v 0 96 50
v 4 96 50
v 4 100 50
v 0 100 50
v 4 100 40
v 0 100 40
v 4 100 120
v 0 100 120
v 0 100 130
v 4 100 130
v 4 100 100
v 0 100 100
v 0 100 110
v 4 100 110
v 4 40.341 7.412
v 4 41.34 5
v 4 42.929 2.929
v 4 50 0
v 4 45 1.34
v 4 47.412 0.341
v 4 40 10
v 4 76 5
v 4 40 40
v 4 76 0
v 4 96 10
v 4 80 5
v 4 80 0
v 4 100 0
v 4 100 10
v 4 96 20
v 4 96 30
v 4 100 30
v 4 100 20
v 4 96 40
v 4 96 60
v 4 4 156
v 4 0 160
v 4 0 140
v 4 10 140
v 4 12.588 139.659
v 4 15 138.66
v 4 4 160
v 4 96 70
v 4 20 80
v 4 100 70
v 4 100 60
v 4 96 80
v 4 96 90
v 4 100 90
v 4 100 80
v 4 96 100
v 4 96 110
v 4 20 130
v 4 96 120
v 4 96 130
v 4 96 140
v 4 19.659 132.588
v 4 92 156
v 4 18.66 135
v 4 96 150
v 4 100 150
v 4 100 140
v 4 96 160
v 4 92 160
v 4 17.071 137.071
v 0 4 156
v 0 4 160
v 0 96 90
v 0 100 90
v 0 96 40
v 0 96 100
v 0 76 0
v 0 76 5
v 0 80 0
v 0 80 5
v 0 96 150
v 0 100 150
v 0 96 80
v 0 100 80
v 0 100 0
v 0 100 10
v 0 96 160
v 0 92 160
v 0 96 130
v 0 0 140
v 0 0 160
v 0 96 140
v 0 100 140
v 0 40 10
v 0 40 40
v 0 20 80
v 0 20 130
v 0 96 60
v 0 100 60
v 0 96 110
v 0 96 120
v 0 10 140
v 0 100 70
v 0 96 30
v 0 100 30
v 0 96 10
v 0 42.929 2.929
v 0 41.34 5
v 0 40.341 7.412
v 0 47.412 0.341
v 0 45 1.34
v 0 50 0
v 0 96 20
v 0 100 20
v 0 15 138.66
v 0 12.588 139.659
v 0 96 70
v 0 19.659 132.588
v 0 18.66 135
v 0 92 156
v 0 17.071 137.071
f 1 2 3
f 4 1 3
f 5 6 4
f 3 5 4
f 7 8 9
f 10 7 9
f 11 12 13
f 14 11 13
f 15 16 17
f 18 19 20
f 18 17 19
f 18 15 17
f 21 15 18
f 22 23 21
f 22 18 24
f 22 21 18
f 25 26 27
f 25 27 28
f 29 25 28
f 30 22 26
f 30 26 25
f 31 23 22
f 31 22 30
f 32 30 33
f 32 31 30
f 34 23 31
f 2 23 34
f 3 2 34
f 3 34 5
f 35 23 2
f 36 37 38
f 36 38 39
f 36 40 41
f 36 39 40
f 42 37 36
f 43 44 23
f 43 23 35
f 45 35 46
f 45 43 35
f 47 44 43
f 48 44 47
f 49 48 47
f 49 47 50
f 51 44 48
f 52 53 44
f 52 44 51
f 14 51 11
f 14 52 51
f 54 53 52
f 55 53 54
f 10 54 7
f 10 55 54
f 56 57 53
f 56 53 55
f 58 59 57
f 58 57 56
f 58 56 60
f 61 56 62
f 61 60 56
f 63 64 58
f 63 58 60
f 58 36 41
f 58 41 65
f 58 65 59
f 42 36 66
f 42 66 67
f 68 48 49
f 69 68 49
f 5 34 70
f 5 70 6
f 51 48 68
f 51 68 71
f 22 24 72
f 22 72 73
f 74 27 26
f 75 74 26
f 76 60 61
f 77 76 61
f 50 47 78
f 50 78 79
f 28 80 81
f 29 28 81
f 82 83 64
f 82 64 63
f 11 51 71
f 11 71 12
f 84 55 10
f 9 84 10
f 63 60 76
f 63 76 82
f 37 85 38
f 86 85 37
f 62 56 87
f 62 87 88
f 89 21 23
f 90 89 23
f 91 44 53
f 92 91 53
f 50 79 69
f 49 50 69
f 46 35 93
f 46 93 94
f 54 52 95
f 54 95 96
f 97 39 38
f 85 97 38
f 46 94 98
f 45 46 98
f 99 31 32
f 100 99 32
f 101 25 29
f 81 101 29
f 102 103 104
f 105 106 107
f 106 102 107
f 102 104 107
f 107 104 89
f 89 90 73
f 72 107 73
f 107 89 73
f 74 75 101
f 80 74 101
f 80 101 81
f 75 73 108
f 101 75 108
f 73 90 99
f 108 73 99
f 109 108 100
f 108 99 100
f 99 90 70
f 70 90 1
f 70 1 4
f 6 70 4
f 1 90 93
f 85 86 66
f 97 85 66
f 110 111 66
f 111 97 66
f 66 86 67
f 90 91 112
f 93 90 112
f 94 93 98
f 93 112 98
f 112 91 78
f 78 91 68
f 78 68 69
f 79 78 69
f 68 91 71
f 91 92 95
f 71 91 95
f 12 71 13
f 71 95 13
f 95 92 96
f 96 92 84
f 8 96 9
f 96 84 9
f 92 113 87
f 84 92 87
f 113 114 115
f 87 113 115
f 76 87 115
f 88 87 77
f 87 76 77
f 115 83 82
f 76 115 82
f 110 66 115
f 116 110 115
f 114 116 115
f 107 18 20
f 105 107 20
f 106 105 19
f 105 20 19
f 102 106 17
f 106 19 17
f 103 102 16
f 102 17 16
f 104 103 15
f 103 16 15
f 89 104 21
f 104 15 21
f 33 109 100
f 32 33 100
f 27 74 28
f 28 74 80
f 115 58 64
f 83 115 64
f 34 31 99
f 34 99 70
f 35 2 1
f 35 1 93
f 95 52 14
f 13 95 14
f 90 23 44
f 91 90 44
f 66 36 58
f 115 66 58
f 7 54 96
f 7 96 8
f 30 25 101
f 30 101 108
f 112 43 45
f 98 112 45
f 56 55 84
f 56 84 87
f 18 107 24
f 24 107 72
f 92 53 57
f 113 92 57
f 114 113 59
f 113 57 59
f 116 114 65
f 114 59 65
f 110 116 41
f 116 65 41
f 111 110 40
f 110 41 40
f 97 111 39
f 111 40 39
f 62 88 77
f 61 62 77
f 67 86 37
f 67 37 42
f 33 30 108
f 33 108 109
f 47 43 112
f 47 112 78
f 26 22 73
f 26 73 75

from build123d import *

# Parameters (mm, degrees)
F0_W     = 100
F0_H     = 160
F1_DEPTH = 4
F2_W     = 4
F2_H     = 10
F3_DEPTH = 4
F4_W     = 4
F4_H     = 5
F4_W_2   = 88
F4_H_2   = 4
F5_DEPTH = 4
F7_DEPTH = 4


with BuildPart() as f1:
    # F0 (on Right) → F1 (new body)
    with BuildSketch(Plane.YZ):
        with Locations((50, 80)):
            Rectangle(F0_W, F0_H)
    extrude(amount=F1_DEPTH)

    # F2 (on face) → F3 (cut, through all)
    with BuildSketch(Plane.YZ.offset(4)):
        with Locations((98, 155)):
            Rectangle(F2_W, F2_H)
        with Locations((98, 135)):
            Rectangle(F2_W, F2_H)
        with Locations((98, 115)):
            Rectangle(F2_W, F2_H)
        with Locations((98, 95)):
            Rectangle(F2_W, F2_H)
        with Locations((98, 75)):
            Rectangle(F2_W, F2_H)
        with Locations((98, 55)):
            Rectangle(F2_W, F2_H)
        with Locations((98, 35)):
            Rectangle(F2_W, F2_H)
        with Locations((98, 15)):
            Rectangle(F2_W, F2_H)
    extrude(amount=-F3_DEPTH, mode=Mode.SUBTRACT)

    # F4 (on face) → F5 (cut, through all)
    with BuildSketch(Plane.YZ.offset(4)):
        with Locations((78, 2.5)):
            Rectangle(F4_W, F4_H)
        with Locations((48, 158)):
            Rectangle(F4_W_2, F4_H_2)
    extrude(amount=-F5_DEPTH, mode=Mode.SUBTRACT)

    # F6 (on face) → F7 (cut, through all)
    with BuildSketch(Plane.YZ.offset(4)):
        with BuildLine():
            Line((10, 140), (0, 140))
            Line((0, 140), (0, 0))
            Line((0, 0), (40, 0))
            Line((40, 0), (40, 10))
            Line((40, 10), (40, 40))
            Line((40, 40), (20, 80))
            Line((20, 80), (20, 130))
            ThreePointArc((20, 130), (17.071068, 137.071068), (10, 140))
        make_face()
        with BuildLine():
            Line((40, 10), (40, 0))
            Line((40, 0), (50, 0))
            ThreePointArc((50, 0), (42.928932, 2.928932), (40, 10))
        make_face()
    extrude(amount=-F7_DEPTH, mode=Mode.SUBTRACT)


solid = f1.part
